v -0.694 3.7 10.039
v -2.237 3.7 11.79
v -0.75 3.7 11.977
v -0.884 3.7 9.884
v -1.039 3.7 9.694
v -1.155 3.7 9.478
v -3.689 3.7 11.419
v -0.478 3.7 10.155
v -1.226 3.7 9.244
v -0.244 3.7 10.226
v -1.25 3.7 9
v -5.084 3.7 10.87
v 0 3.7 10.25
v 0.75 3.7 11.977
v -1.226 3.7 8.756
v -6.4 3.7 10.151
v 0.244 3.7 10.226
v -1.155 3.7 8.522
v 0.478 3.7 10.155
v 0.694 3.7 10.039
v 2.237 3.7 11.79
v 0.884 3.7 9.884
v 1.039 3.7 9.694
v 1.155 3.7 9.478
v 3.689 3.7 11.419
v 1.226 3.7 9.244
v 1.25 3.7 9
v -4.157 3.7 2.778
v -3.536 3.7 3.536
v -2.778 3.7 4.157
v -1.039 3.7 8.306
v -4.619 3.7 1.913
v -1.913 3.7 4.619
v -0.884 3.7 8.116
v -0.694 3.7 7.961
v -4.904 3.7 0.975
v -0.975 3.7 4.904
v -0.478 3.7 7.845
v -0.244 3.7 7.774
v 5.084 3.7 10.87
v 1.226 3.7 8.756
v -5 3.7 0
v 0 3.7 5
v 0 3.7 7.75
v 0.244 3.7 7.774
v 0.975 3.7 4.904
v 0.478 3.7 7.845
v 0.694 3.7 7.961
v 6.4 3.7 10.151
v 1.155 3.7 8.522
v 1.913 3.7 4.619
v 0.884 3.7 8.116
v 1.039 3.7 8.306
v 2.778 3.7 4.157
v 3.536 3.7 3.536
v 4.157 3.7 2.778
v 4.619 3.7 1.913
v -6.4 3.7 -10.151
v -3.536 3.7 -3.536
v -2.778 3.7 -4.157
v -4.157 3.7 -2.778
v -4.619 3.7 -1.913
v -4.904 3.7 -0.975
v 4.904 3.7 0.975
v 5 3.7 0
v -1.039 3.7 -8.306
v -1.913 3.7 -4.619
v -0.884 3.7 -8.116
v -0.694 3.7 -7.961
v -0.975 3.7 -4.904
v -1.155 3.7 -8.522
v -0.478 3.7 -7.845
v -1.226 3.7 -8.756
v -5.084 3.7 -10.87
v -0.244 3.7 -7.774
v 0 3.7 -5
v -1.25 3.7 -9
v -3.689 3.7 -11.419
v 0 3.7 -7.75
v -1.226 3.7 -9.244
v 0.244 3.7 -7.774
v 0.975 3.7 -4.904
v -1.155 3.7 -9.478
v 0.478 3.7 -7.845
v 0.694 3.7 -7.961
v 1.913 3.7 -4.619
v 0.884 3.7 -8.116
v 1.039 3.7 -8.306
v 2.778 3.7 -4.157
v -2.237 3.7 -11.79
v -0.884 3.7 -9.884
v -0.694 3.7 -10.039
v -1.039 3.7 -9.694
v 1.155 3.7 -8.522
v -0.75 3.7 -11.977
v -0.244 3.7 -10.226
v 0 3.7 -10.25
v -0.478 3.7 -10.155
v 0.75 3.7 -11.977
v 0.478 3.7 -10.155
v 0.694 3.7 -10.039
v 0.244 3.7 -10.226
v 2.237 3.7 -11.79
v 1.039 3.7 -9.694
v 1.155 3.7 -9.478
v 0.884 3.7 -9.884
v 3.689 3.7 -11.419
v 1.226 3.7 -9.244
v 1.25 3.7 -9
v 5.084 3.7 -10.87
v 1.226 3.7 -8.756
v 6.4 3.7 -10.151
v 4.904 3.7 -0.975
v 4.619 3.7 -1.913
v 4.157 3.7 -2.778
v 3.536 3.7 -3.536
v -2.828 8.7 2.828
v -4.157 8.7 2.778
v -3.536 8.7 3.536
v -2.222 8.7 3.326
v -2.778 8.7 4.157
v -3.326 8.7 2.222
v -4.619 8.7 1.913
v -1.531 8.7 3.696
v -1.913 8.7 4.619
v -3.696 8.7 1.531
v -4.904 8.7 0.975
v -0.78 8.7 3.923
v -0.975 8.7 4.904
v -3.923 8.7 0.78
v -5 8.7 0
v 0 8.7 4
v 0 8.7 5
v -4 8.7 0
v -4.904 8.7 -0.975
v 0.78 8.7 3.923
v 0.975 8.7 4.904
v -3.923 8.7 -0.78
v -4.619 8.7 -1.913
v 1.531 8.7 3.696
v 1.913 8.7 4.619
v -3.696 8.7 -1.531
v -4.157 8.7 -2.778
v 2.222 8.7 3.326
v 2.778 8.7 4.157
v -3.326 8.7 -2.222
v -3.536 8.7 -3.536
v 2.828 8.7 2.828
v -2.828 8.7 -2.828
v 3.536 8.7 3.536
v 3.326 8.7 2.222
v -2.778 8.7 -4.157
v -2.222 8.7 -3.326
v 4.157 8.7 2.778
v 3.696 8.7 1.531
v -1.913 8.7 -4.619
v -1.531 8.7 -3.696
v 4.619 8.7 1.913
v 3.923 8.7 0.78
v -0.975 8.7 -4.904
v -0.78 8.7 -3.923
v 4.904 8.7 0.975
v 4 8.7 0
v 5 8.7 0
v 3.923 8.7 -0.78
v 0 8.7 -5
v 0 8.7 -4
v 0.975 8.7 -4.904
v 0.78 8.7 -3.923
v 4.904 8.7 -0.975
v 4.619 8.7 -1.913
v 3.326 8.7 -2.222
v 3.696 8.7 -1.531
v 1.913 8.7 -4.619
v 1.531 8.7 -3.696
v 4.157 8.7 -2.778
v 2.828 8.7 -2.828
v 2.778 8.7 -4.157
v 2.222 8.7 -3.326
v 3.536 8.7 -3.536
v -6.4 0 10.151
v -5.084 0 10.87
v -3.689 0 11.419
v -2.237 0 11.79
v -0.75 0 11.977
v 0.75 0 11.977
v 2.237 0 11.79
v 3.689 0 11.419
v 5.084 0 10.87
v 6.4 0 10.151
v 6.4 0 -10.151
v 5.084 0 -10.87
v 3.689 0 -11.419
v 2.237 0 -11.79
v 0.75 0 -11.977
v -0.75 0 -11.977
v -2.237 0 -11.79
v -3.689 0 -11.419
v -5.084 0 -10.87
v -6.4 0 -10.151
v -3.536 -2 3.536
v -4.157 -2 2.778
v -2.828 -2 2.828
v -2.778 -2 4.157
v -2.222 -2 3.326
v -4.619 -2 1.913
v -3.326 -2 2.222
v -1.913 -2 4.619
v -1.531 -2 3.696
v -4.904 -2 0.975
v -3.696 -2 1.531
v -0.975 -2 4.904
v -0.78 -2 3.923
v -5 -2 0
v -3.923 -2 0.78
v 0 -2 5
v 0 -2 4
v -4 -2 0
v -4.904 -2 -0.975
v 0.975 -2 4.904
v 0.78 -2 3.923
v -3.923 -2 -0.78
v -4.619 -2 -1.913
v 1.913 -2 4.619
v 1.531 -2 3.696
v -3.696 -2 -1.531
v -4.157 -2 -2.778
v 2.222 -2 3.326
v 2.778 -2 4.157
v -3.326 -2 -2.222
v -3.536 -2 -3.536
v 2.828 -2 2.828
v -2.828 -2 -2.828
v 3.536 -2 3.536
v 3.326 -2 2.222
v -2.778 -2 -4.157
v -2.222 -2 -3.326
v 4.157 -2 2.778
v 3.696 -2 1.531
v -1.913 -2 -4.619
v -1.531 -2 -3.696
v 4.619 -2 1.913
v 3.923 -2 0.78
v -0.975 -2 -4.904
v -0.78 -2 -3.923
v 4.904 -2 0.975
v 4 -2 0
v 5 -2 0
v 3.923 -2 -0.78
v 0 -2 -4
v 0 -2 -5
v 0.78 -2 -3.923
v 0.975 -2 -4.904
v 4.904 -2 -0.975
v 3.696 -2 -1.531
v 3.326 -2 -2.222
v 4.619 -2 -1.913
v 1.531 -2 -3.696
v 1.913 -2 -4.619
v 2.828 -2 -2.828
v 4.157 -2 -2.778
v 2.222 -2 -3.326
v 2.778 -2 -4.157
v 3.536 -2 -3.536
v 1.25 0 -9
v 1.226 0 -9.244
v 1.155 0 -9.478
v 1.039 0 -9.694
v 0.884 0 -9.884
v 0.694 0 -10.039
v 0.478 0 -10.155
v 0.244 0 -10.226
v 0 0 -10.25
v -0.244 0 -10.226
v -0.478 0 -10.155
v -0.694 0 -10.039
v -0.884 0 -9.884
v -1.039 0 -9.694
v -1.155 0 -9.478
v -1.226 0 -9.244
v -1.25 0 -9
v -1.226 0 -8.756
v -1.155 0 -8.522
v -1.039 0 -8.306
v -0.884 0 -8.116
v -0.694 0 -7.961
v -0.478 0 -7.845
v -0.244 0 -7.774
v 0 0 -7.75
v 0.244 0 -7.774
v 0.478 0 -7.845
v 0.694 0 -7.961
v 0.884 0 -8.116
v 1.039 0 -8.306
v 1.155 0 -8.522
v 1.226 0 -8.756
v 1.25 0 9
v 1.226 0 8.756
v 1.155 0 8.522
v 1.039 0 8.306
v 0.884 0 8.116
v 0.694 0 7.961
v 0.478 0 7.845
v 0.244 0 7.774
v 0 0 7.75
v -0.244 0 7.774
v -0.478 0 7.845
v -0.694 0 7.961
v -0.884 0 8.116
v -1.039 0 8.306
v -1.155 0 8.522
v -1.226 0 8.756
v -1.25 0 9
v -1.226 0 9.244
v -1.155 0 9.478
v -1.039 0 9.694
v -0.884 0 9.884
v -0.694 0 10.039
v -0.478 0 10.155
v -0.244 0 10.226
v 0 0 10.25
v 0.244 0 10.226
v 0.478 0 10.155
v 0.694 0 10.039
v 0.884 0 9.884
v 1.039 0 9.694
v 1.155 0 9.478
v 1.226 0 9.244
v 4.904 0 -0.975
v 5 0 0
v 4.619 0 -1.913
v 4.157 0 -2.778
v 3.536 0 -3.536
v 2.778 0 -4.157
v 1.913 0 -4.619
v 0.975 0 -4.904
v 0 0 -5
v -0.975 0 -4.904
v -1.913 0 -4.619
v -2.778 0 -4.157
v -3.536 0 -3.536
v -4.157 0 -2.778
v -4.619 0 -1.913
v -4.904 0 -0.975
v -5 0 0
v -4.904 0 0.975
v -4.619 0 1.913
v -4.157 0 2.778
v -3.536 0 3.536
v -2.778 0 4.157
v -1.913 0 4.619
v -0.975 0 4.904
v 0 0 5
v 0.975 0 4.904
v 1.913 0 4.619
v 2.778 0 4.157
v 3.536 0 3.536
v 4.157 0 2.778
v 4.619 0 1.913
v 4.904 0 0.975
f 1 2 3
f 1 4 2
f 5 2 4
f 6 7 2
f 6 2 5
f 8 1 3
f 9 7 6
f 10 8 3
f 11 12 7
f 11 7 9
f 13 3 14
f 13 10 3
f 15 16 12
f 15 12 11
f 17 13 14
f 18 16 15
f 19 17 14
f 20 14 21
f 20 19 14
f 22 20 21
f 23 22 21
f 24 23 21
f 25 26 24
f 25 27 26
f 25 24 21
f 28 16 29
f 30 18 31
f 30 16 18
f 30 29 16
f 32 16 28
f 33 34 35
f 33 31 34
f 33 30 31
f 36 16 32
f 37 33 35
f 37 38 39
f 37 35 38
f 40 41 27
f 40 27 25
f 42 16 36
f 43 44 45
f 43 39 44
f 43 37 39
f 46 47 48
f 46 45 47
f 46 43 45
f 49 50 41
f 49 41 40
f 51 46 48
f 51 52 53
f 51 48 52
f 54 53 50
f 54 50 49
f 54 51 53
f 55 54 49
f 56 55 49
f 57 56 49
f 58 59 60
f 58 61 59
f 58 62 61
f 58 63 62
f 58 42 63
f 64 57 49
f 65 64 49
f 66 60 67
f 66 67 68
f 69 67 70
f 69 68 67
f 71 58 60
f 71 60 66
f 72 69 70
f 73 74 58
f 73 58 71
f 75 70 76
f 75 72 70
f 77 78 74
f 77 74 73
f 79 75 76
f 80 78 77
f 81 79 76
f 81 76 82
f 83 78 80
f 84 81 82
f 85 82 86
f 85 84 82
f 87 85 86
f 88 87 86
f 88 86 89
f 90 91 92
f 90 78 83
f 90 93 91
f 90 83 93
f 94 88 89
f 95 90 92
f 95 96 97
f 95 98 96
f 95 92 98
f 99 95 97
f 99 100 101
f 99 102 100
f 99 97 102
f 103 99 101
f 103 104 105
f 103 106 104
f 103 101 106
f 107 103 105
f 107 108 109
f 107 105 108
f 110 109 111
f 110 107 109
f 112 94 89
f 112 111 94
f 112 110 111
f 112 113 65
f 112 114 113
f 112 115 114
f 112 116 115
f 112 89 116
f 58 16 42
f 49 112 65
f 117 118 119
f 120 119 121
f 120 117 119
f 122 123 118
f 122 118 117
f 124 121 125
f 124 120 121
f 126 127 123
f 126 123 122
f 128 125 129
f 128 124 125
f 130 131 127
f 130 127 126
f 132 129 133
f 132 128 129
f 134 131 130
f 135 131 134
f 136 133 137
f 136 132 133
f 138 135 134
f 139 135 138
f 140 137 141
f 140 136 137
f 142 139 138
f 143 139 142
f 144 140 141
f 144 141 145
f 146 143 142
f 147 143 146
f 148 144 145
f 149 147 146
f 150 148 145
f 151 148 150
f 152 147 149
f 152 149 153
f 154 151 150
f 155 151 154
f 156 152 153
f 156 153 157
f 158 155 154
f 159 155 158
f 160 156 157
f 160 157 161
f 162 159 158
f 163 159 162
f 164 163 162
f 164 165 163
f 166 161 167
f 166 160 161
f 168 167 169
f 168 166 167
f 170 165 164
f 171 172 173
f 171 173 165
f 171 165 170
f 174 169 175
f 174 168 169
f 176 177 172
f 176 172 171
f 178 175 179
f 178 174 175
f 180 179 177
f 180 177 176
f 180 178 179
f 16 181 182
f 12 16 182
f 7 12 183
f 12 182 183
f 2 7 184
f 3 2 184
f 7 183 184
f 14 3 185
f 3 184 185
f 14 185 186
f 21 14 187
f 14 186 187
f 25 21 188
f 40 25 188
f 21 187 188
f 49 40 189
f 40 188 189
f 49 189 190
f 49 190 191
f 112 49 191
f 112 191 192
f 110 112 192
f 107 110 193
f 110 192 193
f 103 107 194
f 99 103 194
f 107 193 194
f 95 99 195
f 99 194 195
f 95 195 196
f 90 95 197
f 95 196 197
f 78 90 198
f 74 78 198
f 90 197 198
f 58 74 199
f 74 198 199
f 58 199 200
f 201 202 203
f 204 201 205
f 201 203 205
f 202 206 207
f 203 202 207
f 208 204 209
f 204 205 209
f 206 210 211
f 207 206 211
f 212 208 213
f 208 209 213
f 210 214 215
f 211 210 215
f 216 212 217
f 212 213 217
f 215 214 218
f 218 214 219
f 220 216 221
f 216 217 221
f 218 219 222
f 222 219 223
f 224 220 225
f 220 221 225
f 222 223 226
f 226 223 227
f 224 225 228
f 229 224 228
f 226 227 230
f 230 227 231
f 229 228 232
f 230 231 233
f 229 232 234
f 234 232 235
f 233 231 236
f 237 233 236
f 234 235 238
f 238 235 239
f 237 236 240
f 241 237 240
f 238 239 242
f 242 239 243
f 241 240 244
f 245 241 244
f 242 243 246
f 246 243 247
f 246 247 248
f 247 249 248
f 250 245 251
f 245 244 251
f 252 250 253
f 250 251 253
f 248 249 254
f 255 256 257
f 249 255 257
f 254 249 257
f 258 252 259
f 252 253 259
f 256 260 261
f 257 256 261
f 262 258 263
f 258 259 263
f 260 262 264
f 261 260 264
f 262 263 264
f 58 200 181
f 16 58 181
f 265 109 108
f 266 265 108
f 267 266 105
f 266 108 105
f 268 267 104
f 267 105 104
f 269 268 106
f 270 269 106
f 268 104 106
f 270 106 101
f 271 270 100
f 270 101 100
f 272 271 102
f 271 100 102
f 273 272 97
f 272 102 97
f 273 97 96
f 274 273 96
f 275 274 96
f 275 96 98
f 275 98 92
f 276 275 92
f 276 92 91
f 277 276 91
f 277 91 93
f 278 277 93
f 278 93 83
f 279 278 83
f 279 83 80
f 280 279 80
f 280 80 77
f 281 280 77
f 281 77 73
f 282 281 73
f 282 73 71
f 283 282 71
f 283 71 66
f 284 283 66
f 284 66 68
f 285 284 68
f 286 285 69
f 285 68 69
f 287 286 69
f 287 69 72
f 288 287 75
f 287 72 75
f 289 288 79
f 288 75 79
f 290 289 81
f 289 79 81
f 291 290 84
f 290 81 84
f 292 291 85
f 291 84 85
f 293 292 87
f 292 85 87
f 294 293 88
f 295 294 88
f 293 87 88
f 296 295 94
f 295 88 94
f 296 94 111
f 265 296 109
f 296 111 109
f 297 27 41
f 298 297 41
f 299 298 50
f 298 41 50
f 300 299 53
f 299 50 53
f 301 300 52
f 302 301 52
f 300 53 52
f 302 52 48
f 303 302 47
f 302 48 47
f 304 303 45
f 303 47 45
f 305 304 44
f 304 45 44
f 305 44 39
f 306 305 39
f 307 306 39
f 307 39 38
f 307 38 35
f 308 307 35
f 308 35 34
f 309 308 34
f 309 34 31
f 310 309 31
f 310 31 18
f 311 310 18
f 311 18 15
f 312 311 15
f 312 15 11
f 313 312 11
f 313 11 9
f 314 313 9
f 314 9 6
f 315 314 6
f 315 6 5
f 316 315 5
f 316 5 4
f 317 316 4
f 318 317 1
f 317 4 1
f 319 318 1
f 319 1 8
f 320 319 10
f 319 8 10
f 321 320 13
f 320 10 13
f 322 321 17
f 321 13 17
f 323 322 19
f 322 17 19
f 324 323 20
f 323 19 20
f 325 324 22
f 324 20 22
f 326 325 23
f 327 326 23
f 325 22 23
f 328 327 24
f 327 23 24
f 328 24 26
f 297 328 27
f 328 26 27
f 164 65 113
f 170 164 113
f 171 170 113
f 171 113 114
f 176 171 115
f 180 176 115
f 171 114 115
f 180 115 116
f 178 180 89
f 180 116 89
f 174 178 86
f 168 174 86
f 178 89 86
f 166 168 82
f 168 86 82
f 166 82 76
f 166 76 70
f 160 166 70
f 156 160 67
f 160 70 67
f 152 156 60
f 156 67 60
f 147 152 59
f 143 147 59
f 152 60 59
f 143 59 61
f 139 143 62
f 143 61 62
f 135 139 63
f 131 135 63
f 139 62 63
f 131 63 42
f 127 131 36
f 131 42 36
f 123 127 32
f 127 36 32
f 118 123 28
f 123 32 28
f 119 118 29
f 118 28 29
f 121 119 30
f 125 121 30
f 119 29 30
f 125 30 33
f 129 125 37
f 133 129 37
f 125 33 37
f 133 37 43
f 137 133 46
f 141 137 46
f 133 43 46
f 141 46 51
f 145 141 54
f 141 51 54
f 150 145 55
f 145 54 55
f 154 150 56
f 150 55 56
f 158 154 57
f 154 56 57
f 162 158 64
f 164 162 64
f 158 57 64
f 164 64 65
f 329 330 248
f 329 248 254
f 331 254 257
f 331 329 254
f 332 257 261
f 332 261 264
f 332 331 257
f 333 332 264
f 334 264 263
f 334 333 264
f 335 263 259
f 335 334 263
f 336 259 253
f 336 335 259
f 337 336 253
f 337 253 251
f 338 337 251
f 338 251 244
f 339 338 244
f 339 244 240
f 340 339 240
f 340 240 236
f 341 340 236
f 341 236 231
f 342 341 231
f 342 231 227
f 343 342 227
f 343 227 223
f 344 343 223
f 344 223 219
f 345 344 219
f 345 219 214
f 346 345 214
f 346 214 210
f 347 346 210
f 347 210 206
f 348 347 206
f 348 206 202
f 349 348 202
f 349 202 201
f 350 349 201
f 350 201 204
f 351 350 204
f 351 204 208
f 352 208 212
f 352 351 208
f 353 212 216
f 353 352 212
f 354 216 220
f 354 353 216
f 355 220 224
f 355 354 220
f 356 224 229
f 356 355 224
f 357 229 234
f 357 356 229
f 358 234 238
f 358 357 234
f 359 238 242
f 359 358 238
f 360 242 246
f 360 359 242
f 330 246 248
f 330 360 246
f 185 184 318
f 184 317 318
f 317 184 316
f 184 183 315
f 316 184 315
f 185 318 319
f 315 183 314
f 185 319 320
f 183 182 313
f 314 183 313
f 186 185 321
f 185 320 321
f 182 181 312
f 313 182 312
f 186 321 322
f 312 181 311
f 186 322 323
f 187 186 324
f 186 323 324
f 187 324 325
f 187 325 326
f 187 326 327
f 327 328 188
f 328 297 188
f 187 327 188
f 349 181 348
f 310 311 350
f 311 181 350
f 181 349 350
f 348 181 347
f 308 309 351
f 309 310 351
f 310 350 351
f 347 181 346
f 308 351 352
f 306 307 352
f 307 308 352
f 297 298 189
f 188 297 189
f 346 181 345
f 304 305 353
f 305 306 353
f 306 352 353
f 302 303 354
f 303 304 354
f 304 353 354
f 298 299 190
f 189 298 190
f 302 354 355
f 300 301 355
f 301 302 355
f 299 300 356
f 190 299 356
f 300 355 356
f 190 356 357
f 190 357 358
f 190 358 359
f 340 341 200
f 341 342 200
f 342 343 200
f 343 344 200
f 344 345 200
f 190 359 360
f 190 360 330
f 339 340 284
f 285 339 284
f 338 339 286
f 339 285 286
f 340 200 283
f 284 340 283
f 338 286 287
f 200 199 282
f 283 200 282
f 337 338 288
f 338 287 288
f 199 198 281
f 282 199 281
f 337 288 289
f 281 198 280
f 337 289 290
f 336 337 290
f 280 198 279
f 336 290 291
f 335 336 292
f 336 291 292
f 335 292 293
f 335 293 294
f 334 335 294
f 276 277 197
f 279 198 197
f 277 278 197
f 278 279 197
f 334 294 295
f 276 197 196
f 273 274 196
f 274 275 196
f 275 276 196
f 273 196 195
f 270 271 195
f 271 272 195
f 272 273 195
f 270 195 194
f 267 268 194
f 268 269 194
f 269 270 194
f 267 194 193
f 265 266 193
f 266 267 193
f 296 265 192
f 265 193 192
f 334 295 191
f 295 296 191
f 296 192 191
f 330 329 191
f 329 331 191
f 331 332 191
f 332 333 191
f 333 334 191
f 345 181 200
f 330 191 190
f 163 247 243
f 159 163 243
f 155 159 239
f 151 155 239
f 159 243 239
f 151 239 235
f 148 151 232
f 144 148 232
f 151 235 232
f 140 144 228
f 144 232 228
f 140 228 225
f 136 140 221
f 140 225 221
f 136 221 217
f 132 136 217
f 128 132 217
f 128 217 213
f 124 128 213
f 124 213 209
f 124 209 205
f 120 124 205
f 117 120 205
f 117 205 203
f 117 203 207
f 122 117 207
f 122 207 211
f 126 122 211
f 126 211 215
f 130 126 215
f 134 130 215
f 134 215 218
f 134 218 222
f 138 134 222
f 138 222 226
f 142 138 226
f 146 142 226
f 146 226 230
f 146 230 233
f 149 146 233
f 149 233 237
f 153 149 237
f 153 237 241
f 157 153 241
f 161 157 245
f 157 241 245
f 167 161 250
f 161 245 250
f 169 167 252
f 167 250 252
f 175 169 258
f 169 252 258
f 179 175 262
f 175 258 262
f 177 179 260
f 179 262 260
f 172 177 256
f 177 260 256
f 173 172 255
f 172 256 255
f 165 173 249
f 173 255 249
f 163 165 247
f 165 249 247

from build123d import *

# Parameters (mm, degrees)
BOSS_EXTRUDE1_DEPTH      = 3.7
SKETCH2_R                = 5
BOSS_EXTRUDE2_DEPTH      = 5
BOSS_EXTRUDE2_DEPTH_BACK = 5.7
HOLE_WIZARD_M3_1_D       = 2.5
HOLE_WIZARD_M3_1_DEPTH   = 3.7
CUT_EXTRUDE_1_REACH      = 12.7
SKETCH_3_R               = 4


with BuildPart() as part:
    # Sketch1 → Boss-Extrude1 (new body)
    with BuildSketch(Plane(origin=(0, 0, 0), x_dir=(1, 0, 0), z_dir=(0, 1, 0))):
        with BuildLine():
            Line((-6.4, 10.150862032), (-6.4, -10.150862032))
            ThreePointArc((-6.4, -10.150862032), (0, -12), (6.4, -10.150862032))
            Line((6.4, -10.150862032), (6.4, 10.150862032))
            ThreePointArc((6.4, 10.150862032), (0, 12), (-6.4, 10.150862032))
        make_face()
    extrude(amount=BOSS_EXTRUDE1_DEPTH)

    # Sketch2 → Boss-Extrude2 (add, two sides)
    with BuildSketch(Plane(origin=(0, 3.7, 0), x_dir=(1, 0, 0), z_dir=(0, 1, 0))) as boss_extrude2_sk:
        Circle(SKETCH2_R)
    extrude(amount=BOSS_EXTRUDE2_DEPTH)
    extrude(boss_extrude2_sk.sketch, amount=-BOSS_EXTRUDE2_DEPTH_BACK)

    # M3 螺纹孔1
    with Locations(Plane(origin=(0, 0, 0), x_dir=(-1, 0, 0), z_dir=(0, -1, 0))):
        with Locations((0, -9), (0, 9)):
            Hole(HOLE_WIZARD_M3_1_D / 2, depth=HOLE_WIZARD_M3_1_DEPTH)

    # 草图3 → 切除-拉伸1 (cut, up to next)
    with BuildSketch(Plane.XZ.offset(2), mode=Mode.PRIVATE) as cut_extrude_1_sk1:
        Circle(SKETCH_3_R)
    cut_extrude_1_tool1 = extrude(cut_extrude_1_sk1.sketch, amount=-CUT_EXTRUDE_1_REACH, mode=Mode.PRIVATE) & part.part
    add(cut_extrude_1_tool1.solids().sort_by_distance((0, -2, 0))[0], mode=Mode.SUBTRACT)


solid = part.part
